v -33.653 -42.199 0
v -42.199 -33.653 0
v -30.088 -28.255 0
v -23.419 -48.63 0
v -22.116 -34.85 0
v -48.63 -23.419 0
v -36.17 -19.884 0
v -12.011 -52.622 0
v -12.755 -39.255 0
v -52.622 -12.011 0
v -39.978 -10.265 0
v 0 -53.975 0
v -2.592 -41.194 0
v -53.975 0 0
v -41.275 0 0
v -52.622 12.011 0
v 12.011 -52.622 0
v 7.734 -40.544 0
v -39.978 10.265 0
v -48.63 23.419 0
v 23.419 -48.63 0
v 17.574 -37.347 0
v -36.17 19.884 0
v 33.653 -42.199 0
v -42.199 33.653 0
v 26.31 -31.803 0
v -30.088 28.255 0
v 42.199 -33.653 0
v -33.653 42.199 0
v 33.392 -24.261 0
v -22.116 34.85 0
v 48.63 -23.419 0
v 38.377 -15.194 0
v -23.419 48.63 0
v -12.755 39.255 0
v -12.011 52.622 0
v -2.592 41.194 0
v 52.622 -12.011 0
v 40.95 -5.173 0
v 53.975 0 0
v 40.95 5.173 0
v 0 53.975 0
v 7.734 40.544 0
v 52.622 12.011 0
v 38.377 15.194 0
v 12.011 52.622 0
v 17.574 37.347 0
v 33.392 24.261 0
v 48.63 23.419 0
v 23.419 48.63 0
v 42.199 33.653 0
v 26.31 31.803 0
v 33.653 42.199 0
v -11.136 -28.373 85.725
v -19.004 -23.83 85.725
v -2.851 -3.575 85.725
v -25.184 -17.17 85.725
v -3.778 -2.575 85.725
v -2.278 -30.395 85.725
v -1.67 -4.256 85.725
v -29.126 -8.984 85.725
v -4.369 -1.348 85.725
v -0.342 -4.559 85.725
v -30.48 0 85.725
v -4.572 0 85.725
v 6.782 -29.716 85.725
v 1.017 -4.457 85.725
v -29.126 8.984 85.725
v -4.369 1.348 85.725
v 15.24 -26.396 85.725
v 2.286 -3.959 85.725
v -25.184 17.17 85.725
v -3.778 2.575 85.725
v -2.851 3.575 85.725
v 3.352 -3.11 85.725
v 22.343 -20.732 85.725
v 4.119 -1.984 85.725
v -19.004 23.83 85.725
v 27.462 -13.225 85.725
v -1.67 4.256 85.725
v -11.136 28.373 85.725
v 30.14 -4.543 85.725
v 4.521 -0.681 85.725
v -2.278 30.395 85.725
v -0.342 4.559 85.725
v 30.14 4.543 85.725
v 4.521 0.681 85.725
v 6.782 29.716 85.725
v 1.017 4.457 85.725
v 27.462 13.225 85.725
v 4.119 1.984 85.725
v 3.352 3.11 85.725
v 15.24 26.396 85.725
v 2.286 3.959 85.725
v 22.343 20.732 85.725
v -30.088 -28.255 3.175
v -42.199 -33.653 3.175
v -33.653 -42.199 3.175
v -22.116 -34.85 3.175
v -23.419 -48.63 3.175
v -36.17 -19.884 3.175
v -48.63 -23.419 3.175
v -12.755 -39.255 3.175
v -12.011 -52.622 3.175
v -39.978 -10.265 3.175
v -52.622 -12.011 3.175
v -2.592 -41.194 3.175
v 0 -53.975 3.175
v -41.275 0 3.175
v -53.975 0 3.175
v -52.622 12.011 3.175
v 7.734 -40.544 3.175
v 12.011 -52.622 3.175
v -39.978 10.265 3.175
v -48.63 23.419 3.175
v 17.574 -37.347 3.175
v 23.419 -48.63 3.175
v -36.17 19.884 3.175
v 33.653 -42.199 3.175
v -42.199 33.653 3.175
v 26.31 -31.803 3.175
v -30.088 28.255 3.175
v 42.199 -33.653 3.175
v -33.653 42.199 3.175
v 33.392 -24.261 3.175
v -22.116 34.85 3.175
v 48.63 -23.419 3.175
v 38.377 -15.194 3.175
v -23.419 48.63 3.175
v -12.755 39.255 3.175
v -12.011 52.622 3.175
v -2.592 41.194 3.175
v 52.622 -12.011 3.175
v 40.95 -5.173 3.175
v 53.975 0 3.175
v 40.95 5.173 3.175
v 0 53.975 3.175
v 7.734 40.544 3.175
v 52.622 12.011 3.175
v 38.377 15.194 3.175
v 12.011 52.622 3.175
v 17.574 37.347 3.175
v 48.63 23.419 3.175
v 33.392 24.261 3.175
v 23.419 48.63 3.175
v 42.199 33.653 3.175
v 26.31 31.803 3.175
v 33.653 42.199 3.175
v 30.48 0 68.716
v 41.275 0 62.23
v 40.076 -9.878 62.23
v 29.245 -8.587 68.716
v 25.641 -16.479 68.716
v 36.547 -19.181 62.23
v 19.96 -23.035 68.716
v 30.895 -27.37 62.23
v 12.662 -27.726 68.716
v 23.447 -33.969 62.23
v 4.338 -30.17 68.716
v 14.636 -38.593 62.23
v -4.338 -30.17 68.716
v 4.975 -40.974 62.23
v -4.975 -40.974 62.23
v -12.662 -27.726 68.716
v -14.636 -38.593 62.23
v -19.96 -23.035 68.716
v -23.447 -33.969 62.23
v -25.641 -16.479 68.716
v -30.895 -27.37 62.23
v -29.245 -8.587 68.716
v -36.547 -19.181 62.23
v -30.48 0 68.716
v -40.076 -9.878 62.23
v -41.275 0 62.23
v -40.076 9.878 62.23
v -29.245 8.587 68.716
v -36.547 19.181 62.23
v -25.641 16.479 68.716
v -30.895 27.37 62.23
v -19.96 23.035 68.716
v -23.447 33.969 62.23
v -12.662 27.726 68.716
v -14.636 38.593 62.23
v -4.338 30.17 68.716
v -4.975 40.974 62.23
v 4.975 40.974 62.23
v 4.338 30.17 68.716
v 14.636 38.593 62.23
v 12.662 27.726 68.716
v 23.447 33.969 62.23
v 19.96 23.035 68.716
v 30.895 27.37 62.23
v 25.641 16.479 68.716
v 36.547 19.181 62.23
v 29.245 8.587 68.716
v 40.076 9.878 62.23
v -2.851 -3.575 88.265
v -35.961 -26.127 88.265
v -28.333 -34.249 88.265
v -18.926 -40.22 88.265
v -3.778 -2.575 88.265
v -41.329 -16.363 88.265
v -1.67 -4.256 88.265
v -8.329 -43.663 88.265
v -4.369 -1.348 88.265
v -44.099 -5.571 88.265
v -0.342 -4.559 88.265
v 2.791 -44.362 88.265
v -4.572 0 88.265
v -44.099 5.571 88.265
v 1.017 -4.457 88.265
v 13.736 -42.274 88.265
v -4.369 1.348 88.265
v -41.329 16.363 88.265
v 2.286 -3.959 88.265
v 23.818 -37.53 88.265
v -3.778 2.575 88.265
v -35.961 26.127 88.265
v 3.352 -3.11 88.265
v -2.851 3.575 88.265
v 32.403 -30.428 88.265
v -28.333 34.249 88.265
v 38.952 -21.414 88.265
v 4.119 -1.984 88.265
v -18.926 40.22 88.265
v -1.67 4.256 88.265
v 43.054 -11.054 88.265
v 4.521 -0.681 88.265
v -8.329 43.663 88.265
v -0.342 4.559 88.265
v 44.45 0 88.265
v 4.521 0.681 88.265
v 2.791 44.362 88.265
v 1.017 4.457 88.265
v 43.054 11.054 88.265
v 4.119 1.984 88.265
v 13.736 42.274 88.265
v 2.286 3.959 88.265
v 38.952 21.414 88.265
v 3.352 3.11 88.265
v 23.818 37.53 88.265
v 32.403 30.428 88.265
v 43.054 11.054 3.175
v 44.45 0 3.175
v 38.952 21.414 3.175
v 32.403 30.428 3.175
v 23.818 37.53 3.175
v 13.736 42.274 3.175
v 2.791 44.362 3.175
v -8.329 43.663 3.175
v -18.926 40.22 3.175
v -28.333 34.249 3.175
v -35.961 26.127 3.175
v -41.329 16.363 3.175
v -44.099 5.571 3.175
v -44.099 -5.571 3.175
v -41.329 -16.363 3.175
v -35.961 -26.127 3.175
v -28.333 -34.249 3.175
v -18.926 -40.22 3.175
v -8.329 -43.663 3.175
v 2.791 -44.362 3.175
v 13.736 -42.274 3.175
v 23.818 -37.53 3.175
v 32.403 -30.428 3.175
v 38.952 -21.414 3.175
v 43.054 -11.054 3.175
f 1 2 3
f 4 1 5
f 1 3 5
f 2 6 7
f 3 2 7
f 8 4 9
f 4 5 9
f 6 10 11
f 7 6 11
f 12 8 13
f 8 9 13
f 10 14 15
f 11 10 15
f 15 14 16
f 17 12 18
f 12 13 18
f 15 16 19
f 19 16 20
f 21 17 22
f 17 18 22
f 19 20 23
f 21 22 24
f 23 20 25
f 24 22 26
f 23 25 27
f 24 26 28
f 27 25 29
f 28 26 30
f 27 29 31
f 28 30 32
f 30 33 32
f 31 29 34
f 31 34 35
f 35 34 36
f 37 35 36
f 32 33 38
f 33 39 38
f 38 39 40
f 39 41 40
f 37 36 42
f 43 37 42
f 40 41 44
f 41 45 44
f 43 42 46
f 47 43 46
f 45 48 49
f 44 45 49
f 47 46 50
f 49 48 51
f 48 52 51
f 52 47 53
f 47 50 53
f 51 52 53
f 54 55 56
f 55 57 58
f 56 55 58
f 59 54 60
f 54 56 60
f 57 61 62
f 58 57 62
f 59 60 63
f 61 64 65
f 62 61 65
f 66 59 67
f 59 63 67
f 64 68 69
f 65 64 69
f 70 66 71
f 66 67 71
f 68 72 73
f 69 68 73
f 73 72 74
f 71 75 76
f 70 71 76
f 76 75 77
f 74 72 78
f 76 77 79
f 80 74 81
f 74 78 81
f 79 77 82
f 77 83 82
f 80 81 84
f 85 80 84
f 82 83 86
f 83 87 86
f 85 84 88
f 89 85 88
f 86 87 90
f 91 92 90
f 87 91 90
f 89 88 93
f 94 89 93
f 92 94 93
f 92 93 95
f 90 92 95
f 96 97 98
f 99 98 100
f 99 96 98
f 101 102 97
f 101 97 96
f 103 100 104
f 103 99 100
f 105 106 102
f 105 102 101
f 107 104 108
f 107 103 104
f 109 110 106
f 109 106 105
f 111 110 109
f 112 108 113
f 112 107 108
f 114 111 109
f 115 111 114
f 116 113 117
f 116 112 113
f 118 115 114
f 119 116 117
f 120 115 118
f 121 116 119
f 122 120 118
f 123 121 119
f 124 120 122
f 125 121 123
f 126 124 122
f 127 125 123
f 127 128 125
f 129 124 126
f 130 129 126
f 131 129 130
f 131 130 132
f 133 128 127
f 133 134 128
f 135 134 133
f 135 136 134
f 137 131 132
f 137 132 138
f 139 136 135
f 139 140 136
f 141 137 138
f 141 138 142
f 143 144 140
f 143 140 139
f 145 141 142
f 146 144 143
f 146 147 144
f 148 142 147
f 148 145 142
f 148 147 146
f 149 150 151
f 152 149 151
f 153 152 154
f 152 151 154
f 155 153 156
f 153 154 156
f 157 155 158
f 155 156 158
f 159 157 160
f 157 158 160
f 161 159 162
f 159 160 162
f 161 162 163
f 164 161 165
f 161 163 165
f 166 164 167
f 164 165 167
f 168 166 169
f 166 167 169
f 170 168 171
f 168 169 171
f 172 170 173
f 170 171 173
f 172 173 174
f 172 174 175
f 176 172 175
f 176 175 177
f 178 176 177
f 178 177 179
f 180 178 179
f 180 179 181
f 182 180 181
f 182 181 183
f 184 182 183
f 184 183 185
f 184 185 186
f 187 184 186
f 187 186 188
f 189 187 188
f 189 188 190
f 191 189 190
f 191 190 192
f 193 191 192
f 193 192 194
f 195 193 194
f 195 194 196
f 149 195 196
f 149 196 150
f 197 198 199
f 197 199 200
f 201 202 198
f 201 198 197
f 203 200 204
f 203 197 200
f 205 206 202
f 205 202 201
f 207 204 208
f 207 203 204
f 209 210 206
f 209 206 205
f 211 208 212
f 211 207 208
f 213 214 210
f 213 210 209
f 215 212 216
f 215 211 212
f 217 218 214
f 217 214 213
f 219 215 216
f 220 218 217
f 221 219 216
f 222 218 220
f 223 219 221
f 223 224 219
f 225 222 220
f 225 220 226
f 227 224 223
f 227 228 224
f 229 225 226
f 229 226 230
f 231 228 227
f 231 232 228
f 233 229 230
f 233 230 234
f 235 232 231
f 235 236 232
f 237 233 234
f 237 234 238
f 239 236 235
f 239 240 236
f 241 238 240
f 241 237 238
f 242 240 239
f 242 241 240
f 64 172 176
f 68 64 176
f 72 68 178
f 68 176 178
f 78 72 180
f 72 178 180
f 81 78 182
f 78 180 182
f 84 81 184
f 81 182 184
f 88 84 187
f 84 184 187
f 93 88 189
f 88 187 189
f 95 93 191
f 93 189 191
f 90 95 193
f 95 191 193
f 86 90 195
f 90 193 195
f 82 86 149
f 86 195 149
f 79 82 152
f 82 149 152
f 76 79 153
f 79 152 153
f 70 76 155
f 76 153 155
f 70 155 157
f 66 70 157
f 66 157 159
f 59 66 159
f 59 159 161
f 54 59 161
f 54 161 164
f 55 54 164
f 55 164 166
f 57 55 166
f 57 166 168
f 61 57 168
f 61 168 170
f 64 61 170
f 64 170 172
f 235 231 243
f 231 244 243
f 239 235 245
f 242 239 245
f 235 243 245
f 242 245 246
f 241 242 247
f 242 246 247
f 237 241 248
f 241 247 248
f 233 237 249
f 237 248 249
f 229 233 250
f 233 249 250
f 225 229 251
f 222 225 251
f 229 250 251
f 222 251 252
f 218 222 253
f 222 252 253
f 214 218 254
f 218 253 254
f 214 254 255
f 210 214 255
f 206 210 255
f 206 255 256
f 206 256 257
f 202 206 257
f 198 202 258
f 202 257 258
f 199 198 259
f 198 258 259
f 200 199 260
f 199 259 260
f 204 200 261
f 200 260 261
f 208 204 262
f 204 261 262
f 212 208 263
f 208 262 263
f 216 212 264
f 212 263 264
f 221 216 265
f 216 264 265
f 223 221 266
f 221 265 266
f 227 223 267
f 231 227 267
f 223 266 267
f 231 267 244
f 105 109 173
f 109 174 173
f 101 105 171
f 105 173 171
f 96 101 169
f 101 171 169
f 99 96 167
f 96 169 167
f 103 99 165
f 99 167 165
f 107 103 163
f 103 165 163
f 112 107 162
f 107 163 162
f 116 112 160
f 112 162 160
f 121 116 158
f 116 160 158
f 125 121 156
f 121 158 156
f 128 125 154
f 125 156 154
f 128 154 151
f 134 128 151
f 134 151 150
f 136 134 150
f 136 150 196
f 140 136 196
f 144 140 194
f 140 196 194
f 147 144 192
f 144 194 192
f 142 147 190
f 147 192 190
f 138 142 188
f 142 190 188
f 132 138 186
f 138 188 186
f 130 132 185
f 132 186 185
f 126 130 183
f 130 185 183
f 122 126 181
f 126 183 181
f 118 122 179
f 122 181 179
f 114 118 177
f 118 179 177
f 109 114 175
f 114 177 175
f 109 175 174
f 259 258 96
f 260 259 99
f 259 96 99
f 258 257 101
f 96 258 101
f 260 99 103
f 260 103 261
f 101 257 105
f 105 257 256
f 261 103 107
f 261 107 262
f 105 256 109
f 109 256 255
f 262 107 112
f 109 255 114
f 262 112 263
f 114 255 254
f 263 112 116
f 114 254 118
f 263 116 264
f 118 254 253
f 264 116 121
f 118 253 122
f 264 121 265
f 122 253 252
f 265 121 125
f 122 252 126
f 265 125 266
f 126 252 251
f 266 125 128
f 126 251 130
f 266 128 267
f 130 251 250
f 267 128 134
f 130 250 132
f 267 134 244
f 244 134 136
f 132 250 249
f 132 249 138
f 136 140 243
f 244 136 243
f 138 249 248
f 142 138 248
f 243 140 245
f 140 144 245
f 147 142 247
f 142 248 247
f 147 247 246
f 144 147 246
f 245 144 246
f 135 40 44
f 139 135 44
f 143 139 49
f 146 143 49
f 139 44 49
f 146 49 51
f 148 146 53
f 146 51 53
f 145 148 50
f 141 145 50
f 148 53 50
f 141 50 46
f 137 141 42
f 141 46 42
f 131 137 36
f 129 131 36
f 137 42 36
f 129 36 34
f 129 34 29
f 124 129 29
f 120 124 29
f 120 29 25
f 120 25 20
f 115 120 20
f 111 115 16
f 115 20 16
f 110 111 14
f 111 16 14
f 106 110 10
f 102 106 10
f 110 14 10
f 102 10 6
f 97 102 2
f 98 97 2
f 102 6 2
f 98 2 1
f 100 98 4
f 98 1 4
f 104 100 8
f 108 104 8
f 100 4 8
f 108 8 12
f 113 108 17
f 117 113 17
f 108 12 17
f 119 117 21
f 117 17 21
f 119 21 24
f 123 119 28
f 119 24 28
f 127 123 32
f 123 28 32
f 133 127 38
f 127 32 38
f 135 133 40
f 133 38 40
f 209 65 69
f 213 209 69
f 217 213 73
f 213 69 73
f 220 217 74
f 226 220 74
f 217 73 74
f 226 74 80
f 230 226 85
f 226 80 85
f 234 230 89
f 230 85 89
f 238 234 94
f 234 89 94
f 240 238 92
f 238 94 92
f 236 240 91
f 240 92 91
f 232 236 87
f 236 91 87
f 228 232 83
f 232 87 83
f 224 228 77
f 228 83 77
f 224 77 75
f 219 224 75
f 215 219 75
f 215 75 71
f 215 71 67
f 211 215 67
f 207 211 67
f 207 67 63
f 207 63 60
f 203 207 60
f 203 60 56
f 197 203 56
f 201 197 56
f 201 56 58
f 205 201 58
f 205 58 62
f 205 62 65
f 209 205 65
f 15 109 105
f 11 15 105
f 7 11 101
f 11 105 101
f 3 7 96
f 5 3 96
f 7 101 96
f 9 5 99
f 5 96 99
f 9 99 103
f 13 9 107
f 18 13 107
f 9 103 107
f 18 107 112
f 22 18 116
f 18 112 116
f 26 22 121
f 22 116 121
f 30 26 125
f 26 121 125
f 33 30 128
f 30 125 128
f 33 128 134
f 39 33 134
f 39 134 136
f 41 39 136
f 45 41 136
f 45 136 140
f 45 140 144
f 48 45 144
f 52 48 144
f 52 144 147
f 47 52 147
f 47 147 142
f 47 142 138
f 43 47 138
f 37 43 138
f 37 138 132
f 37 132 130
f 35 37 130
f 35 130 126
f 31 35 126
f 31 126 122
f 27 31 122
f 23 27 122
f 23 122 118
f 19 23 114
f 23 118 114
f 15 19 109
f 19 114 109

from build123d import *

# Parameters (mm, degrees)
F0_R       = 53.975
F1_DEPTH   = 3.175
F2_R       = 44.45
F3_DEPTH   = 63.5
F4_R       = 44.45
F5_DEPTH   = 19.05
F7_D       = 82.55
F7_DEPTH   = 62.23
F7_TIP     = 24.8005220504
F7_2_D     = 82.55
F7_2_DEPTH = 62.23
F7_2_TIP   = 24.8005220504
F9_D       = 60.96
F9_DEPTH   = 17.78
F9_TIP     = 18.314231668
F10_R      = 44.45
F11_DEPTH  = 2.54
F13_D      = 9.144
F13_DEPTH  = 17.78
F13_TIP    = 2.7471347502


with BuildPart() as f1:
    # F0 (on Top) → F1 (new body)
    with BuildSketch(Plane.XY):
        Circle(F0_R)
    extrude(amount=F1_DEPTH)

    # F7
    with Locations(Plane(origin=(0, 0, 0), x_dir=(1, 0, 0), z_dir=(0, 0, -1))):
        with Locations((0, 0)):
            Hole(F7_D / 2, depth=F7_DEPTH)
            with Locations((0, 0, -(F7_DEPTH + F7_TIP / 2))):  # 118° drill point
                Cone(0, F7_D / 2, F7_TIP, mode=Mode.SUBTRACT)


with BuildPart() as f3:
    # F2 (on face) → F3 (new body)
    with BuildSketch(Plane.XY.offset(3.175)):
        Circle(F2_R)
    extrude(amount=F3_DEPTH)

    # F4 (on face) → F5 (join)
    with BuildSketch(Plane.XY.offset(66.675)):
        Circle(F4_R)
    extrude(amount=F5_DEPTH)

    # F7#2
    with Locations(Plane(origin=(0, 0, 0), x_dir=(1, 0, 0), z_dir=(0, 0, -1))):
        with Locations((0, 0)):
            Hole(F7_2_D / 2, depth=F7_2_DEPTH)
            with Locations((0, 0, -(F7_2_DEPTH + F7_2_TIP / 2))):  # 118° drill point
                Cone(0, F7_2_D / 2, F7_2_TIP, mode=Mode.SUBTRACT)

    # F9
    with Locations(Plane.XY.offset(85.725)):
        with Locations((0, 0)):
            Hole(F9_D / 2, depth=F9_DEPTH)
            with Locations((0, 0, -(F9_DEPTH + F9_TIP / 2))):  # 118° drill point
                Cone(0, F9_D / 2, F9_TIP, mode=Mode.SUBTRACT)

    # F10 (on face) → F11 (join)
    with BuildSketch(Plane.XY.offset(85.725)):
        Circle(F10_R)
    extrude(amount=F11_DEPTH)

    # F13
    with Locations(Plane.XY.offset(88.265)):
        with Locations((0, 0)):
            Hole(F13_D / 2, depth=F13_DEPTH)
            with Locations((0, 0, -(F13_DEPTH + F13_TIP / 2))):  # 118° drill point
                Cone(0, F13_D / 2, F13_TIP, mode=Mode.SUBTRACT)


solid = Compound([f1.part, f3.part])
